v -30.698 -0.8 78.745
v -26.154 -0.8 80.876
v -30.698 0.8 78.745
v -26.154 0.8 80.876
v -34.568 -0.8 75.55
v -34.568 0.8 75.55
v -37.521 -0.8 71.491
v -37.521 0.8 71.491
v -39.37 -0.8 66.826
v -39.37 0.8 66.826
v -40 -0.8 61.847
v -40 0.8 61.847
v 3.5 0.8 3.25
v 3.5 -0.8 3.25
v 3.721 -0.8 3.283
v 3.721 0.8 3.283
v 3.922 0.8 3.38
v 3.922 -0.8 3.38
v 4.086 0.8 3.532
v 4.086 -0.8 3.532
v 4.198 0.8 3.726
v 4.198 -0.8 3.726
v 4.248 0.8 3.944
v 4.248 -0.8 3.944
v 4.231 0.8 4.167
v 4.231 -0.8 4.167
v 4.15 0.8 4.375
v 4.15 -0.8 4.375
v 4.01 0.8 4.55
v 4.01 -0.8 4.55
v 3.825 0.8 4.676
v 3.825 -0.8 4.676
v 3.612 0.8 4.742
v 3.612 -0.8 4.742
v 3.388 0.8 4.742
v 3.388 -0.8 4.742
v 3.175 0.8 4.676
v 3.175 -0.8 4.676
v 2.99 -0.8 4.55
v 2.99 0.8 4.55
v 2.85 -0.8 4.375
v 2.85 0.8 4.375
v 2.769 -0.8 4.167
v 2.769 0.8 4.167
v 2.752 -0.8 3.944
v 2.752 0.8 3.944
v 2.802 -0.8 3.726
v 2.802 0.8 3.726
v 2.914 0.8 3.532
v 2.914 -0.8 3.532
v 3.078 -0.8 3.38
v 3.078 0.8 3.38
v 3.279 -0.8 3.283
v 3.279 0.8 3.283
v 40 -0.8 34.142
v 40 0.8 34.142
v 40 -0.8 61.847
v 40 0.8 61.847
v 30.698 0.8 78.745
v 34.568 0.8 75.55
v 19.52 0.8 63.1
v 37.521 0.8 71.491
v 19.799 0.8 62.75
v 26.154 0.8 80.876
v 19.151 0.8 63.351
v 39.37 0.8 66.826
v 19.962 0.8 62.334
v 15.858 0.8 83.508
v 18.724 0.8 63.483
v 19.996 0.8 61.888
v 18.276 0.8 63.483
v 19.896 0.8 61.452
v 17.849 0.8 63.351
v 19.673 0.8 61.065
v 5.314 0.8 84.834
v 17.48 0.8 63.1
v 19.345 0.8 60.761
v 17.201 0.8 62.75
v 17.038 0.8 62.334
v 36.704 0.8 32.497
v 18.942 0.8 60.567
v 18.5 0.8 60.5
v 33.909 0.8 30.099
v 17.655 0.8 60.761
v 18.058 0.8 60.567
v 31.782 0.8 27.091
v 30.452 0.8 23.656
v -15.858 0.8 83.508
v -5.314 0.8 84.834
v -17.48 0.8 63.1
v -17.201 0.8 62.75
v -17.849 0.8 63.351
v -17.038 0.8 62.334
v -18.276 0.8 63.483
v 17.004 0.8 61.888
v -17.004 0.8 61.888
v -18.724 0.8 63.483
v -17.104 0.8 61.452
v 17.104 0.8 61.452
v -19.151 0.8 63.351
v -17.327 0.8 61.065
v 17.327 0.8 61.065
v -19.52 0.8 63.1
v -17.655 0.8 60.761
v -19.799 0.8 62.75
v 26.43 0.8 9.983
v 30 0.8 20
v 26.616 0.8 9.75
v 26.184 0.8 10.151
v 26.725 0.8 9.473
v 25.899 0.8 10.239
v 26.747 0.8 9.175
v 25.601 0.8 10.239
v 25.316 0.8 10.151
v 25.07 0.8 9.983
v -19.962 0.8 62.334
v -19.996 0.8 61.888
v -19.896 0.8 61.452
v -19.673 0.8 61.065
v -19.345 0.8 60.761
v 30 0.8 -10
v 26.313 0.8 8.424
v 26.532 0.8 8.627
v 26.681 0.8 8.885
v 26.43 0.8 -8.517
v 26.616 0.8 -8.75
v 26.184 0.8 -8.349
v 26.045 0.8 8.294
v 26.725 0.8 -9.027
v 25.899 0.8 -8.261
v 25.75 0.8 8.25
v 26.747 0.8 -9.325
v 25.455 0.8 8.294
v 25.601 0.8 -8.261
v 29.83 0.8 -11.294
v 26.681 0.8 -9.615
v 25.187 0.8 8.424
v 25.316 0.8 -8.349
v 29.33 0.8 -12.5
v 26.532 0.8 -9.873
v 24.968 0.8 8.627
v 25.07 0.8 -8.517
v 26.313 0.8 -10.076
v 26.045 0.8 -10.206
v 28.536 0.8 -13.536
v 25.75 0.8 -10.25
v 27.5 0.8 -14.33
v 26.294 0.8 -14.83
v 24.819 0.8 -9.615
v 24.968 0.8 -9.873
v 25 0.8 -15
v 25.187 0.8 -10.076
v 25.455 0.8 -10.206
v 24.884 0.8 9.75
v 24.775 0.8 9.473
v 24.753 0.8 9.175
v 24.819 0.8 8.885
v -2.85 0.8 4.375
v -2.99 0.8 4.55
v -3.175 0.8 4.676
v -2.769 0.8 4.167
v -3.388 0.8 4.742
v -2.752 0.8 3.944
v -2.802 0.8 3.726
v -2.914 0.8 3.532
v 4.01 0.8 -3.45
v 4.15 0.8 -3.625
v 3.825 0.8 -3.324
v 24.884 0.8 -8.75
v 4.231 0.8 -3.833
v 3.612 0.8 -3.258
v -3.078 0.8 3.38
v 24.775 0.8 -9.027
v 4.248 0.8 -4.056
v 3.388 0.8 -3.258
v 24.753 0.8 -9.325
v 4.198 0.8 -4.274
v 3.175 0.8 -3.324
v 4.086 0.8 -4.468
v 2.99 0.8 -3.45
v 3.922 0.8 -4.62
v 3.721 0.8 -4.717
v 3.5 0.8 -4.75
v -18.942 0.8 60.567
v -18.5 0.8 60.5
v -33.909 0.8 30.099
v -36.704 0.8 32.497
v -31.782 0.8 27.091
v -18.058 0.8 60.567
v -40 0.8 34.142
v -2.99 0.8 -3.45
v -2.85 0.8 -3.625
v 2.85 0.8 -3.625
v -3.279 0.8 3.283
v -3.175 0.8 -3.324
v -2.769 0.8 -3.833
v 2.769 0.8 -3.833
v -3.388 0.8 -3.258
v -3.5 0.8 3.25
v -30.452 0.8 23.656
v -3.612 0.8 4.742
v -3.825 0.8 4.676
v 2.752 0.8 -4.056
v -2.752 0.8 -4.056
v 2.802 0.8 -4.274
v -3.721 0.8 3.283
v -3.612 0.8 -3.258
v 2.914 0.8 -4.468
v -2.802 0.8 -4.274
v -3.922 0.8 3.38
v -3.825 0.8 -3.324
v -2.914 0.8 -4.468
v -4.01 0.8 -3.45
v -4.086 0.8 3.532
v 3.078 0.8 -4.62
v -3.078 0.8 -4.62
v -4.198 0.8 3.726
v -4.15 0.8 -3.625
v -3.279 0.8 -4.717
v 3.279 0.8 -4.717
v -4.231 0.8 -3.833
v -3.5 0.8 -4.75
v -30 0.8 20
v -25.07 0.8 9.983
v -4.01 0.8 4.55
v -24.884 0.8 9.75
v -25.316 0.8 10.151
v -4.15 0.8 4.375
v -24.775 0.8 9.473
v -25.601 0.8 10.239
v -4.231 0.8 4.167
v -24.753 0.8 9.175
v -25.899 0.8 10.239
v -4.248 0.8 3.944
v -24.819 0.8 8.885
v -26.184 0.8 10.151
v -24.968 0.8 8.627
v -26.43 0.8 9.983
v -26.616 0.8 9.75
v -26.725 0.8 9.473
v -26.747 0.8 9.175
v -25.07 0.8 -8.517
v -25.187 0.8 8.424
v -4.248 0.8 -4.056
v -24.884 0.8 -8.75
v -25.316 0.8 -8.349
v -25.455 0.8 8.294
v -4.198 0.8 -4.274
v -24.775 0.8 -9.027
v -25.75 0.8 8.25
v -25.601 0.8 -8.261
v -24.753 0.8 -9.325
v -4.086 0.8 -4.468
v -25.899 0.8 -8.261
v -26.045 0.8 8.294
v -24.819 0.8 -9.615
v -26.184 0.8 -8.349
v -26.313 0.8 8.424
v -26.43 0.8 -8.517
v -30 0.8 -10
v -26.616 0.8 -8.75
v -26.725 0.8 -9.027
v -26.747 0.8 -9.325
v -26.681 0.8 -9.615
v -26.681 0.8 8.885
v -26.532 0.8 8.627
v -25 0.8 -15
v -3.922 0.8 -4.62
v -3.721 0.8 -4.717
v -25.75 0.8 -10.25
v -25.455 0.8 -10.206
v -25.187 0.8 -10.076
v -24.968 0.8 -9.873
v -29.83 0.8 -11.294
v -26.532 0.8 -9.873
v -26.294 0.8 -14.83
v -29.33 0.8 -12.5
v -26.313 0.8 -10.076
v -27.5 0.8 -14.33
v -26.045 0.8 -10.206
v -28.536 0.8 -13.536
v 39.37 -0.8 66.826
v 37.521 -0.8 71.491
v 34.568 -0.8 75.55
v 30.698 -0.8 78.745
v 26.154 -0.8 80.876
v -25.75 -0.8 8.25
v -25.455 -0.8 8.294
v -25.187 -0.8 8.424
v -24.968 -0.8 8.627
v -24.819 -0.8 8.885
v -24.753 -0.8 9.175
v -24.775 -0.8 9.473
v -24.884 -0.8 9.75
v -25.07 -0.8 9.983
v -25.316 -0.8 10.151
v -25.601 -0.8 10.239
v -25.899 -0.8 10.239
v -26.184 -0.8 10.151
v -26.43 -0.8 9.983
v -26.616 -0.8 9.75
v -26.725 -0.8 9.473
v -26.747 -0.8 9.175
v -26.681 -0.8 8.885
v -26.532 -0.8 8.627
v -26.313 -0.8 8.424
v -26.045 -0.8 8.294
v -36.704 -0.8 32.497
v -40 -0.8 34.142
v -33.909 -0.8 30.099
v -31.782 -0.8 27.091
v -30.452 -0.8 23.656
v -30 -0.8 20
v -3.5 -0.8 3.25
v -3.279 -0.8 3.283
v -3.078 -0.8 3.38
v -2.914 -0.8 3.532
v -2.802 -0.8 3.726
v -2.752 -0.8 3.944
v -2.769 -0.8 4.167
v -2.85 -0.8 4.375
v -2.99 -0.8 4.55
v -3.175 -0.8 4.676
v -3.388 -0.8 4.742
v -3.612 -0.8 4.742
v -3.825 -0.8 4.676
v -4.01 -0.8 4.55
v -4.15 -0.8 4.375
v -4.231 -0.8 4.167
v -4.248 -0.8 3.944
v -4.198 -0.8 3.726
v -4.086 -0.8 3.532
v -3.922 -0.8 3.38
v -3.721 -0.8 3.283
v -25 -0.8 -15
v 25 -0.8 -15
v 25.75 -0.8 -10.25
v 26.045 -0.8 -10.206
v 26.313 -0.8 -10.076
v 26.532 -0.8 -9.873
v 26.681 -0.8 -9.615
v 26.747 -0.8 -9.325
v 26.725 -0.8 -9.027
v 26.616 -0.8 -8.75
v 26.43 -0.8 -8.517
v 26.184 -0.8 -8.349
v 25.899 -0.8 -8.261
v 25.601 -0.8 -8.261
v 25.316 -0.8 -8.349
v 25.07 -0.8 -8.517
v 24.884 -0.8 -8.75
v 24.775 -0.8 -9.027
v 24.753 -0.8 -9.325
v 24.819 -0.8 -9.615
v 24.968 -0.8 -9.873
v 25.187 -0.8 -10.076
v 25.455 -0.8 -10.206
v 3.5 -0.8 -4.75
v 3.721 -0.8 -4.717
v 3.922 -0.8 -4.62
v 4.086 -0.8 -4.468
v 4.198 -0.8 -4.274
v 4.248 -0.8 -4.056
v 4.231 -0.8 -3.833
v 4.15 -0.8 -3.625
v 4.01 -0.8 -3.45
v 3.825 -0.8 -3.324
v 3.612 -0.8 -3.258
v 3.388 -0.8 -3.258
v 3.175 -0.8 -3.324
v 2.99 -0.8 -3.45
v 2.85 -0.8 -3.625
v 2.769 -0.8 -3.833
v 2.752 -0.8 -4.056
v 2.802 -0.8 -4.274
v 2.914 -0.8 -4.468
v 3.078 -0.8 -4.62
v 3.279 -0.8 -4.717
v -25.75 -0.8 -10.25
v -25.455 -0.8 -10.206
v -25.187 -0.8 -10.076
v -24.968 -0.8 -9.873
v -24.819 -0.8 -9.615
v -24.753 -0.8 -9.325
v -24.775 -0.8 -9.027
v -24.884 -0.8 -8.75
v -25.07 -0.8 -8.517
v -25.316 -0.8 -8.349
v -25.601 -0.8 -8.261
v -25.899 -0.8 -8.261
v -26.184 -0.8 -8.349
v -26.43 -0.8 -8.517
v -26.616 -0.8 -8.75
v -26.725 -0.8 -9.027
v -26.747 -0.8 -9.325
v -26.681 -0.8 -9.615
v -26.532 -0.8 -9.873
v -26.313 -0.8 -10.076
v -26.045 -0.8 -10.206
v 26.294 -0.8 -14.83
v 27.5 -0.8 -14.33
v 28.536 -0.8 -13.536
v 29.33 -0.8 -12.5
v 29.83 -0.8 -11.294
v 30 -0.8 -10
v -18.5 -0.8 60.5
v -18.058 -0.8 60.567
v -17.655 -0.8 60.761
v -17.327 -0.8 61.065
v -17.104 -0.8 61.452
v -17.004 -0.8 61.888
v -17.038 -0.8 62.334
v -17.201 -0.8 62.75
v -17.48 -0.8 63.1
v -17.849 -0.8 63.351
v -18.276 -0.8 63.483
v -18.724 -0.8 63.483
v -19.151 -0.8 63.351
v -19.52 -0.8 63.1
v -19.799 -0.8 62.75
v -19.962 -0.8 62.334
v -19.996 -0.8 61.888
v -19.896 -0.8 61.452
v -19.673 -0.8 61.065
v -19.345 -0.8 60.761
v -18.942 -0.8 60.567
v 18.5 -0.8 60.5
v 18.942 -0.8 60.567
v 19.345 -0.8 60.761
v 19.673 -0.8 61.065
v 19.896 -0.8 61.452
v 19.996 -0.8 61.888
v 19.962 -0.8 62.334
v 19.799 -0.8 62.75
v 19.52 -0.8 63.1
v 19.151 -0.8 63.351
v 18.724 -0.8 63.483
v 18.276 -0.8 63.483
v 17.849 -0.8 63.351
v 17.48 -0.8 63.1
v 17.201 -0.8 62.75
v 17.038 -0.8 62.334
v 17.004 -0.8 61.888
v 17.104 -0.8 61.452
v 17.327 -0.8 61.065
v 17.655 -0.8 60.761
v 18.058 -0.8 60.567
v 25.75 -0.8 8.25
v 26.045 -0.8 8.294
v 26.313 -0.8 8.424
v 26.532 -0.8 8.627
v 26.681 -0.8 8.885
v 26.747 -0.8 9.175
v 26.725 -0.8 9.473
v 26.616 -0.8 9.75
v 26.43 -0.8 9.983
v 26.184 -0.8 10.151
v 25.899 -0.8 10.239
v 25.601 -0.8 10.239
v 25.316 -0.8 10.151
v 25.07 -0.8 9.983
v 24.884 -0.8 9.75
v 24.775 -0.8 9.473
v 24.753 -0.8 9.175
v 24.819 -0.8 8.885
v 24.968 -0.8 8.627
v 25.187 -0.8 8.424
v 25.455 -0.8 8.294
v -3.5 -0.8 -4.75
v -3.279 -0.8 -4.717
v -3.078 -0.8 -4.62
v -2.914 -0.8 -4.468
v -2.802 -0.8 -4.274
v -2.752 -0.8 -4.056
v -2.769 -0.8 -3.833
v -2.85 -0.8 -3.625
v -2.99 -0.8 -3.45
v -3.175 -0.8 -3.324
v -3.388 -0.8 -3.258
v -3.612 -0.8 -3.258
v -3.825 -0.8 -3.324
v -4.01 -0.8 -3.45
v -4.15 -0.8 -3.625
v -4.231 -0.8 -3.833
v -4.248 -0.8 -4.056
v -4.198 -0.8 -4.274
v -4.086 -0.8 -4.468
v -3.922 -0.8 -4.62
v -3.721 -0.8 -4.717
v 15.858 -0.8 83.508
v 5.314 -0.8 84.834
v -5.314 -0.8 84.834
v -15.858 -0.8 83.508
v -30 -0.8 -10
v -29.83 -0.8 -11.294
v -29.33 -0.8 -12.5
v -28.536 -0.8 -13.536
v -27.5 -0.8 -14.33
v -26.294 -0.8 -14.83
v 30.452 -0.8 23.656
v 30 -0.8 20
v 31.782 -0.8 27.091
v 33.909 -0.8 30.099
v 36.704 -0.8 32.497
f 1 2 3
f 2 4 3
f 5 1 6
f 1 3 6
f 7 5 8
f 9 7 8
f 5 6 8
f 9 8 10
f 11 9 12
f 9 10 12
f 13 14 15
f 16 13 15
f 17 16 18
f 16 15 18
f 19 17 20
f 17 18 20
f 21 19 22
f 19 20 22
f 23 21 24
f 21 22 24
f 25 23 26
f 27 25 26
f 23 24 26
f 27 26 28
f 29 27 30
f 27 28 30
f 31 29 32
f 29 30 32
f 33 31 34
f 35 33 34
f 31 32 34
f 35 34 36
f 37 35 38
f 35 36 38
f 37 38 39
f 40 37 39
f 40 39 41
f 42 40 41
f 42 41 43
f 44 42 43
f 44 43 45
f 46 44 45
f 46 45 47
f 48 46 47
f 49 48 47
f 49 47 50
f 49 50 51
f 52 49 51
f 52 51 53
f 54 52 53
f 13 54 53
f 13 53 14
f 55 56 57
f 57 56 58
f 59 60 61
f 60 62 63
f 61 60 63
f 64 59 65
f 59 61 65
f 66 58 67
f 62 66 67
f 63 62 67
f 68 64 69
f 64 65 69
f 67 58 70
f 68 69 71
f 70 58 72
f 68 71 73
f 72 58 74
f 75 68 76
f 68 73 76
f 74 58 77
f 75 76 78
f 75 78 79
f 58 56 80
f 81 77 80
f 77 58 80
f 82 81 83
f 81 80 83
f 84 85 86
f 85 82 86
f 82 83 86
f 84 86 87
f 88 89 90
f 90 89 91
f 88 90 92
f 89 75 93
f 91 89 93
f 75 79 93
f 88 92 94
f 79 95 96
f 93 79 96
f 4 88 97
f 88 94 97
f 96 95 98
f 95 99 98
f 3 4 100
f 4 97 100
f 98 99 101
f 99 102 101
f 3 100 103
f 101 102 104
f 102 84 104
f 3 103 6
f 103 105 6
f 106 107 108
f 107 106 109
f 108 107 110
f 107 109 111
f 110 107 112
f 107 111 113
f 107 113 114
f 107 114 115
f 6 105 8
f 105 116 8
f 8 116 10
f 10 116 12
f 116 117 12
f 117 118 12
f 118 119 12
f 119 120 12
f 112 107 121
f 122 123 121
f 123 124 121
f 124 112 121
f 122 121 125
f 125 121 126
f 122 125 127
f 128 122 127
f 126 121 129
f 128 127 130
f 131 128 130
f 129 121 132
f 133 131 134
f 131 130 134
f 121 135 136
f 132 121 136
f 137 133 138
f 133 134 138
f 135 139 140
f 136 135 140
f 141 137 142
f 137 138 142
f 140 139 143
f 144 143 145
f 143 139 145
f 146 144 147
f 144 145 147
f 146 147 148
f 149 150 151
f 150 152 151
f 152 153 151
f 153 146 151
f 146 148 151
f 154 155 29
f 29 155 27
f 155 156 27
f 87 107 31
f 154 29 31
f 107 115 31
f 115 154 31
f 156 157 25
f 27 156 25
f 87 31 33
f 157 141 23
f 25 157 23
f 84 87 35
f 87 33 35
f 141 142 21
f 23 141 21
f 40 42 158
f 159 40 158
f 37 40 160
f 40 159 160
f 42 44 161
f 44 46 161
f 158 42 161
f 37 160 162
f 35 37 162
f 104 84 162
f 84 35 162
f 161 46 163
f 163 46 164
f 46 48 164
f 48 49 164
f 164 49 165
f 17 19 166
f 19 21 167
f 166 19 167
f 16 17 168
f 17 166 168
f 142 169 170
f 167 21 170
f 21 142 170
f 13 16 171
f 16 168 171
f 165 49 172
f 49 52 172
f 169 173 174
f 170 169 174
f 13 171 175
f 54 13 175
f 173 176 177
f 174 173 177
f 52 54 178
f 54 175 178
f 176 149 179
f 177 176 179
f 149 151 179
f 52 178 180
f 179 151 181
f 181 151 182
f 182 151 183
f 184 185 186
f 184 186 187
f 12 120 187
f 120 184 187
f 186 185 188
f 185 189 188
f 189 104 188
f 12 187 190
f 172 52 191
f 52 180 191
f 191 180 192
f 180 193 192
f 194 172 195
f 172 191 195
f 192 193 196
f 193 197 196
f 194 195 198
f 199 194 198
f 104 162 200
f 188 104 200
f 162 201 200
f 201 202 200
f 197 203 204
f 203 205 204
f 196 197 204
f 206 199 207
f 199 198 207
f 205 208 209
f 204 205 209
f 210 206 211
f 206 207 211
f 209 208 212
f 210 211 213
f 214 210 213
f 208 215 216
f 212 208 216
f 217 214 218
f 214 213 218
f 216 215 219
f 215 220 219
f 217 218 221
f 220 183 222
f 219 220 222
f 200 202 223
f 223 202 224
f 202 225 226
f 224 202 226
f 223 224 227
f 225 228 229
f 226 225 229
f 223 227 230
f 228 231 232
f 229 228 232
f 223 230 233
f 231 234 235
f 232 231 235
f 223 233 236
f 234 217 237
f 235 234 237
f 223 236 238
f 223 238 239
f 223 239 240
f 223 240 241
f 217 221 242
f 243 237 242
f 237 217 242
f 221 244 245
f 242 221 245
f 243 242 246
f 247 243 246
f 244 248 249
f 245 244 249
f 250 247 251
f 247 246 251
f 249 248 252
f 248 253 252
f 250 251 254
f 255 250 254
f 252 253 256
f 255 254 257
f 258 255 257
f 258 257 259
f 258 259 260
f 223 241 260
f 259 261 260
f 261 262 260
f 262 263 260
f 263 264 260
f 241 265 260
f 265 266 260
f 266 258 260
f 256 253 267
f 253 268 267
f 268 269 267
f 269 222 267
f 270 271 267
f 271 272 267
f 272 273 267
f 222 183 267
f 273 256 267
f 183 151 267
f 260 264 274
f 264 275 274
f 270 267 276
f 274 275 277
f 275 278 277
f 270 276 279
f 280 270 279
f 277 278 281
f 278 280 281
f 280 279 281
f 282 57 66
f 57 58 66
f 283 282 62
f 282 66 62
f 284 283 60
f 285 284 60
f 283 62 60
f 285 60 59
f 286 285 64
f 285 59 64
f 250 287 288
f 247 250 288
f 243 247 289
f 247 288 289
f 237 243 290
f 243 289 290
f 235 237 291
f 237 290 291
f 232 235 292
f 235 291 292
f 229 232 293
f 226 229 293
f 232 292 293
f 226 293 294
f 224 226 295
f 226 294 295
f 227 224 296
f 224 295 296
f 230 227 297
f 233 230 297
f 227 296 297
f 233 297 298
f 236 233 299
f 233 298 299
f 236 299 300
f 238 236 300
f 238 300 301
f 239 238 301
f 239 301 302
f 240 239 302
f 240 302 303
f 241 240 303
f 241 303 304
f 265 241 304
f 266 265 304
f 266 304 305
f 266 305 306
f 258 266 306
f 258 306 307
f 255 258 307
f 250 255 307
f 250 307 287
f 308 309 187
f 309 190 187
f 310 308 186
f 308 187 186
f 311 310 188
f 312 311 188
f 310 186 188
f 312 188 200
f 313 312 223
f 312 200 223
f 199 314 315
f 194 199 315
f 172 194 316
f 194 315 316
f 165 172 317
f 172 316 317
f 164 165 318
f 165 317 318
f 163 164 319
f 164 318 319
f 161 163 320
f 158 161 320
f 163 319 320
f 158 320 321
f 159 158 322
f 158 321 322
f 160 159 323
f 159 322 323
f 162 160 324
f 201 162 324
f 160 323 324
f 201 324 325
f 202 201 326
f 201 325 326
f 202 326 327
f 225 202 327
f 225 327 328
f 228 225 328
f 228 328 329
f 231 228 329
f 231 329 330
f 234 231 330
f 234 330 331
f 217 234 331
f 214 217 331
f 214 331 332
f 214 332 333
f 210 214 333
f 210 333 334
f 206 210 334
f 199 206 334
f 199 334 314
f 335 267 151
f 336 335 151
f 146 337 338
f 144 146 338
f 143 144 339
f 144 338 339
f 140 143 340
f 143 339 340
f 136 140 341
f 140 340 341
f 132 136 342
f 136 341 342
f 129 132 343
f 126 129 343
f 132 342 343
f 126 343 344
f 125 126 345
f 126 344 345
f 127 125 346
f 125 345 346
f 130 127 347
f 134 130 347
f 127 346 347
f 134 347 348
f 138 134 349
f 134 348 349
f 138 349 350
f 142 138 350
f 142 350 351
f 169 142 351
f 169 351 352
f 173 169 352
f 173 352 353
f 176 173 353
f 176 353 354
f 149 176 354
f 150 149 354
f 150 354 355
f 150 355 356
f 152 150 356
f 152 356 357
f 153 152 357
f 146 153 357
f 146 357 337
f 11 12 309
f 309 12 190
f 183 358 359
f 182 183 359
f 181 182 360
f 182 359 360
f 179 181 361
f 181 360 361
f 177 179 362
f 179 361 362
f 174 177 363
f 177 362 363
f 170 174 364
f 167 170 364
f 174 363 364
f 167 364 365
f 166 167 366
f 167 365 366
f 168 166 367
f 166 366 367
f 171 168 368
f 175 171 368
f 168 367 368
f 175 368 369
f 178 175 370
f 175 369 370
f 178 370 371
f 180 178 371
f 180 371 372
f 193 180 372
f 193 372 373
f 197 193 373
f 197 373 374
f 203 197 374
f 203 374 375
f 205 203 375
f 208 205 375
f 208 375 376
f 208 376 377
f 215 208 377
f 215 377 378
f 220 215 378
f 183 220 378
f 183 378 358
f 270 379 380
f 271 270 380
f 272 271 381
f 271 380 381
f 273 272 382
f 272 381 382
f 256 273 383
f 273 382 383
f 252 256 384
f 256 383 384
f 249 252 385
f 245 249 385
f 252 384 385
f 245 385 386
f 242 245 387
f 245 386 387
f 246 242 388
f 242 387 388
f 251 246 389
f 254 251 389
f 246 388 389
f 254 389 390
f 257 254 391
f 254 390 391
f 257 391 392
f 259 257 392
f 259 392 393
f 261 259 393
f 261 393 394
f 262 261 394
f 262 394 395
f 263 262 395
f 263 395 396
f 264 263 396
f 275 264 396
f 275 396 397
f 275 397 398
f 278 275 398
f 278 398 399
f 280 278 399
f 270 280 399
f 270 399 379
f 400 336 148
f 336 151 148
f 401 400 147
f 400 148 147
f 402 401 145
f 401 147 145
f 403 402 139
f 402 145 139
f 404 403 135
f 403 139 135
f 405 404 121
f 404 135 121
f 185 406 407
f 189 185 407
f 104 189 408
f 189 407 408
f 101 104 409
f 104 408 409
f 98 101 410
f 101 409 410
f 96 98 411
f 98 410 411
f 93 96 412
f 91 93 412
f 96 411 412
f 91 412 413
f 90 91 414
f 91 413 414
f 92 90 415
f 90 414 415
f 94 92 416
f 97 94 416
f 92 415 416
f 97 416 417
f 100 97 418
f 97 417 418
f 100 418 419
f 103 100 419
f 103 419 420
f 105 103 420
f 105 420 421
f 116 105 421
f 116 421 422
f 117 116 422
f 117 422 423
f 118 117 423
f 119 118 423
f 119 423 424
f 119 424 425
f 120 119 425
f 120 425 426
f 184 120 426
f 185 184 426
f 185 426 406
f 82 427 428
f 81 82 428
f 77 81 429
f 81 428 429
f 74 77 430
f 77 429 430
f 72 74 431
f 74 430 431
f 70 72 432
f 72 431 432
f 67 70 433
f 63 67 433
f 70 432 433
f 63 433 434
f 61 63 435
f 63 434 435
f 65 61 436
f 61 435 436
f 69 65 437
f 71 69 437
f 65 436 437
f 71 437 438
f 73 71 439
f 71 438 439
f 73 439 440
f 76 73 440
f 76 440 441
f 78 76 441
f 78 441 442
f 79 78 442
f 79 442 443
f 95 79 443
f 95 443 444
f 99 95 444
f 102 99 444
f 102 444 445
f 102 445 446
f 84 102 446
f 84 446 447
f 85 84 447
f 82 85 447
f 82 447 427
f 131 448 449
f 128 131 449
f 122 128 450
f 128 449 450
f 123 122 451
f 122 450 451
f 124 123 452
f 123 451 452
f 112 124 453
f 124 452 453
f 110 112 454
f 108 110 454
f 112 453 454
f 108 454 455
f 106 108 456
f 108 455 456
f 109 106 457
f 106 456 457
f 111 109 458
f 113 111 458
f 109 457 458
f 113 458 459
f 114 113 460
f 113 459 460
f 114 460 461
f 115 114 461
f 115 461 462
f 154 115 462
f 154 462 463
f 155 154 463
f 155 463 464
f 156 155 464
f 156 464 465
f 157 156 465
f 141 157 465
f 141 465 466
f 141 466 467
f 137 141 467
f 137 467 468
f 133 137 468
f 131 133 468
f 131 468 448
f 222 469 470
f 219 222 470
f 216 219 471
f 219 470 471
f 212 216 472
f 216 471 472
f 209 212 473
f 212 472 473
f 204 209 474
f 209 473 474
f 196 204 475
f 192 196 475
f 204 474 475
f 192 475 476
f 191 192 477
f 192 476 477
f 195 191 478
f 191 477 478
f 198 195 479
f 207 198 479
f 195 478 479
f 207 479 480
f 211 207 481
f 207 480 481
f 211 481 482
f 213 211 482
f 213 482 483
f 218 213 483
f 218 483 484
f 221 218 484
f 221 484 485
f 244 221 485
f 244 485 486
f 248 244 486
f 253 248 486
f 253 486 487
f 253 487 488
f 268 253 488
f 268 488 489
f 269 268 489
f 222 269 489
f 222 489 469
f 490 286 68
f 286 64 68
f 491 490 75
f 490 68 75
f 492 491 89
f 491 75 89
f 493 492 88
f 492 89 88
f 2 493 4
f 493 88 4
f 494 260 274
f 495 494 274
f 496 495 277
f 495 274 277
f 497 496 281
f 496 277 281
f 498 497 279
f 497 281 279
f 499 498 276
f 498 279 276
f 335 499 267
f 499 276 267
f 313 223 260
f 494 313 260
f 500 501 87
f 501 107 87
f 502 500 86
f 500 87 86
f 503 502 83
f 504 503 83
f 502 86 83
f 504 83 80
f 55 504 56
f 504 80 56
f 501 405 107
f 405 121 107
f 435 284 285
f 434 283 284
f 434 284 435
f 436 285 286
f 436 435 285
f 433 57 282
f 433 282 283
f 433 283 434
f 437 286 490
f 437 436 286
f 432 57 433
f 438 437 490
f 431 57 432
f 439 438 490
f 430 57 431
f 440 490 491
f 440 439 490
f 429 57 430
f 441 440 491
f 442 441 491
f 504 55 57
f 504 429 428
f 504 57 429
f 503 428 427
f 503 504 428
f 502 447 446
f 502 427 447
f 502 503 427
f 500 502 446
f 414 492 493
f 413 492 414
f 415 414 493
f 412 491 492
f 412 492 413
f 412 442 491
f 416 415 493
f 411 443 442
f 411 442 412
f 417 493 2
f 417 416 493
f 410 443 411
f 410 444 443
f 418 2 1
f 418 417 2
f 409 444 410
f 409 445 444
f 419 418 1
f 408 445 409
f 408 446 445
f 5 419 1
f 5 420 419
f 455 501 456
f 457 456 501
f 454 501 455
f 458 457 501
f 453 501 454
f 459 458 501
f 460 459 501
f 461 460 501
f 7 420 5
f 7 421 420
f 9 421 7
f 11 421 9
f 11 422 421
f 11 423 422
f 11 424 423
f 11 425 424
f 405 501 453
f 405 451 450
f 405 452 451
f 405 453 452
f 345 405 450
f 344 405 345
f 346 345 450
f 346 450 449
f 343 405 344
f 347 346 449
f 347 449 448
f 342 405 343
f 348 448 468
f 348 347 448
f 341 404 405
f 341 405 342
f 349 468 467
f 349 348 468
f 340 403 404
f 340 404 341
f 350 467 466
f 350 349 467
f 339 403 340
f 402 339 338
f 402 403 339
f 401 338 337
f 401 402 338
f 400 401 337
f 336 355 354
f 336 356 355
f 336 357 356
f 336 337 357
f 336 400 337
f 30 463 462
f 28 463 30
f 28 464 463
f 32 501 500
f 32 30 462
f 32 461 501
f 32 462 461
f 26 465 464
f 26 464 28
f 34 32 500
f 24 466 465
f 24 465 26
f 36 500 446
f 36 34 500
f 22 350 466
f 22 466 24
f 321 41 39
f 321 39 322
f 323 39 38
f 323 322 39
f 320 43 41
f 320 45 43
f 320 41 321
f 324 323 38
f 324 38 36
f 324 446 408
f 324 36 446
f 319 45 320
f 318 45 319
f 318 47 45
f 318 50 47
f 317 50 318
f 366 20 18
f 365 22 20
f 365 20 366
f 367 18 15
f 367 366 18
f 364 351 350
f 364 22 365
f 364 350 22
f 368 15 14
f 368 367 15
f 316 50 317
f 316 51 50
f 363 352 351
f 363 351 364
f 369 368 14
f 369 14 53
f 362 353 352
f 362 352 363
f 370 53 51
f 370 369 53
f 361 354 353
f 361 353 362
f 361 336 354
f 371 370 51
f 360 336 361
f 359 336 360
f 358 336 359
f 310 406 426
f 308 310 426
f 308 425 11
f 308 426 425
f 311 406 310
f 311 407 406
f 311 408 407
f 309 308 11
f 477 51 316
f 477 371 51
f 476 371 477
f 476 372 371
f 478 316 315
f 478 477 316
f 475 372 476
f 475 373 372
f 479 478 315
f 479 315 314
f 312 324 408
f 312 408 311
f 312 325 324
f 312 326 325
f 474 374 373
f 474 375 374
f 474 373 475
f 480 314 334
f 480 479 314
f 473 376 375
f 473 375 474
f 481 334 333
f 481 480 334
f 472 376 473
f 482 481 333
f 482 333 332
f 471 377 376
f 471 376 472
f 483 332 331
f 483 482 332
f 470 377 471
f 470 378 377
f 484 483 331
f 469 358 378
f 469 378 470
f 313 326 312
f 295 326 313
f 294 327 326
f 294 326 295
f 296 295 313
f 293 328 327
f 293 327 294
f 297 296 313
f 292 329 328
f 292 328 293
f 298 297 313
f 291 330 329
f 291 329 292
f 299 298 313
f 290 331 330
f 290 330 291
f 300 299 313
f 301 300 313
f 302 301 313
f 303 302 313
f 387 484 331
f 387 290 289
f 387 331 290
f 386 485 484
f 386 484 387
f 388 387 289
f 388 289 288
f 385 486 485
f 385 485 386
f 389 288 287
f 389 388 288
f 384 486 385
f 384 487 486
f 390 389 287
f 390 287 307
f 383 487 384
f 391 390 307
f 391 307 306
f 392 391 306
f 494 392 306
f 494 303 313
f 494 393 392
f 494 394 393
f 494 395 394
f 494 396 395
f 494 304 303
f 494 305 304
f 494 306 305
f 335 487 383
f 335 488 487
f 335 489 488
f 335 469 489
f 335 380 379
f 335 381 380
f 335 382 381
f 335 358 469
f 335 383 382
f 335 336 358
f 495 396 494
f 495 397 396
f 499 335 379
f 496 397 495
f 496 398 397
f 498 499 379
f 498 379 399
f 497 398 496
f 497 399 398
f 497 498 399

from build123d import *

# Parameters (mm, degrees)
P_IDAT_VYSUNUT_M1_DEPTH  = 0.8
SKICA2_R                 = 1
ODEBRAT_VYSUNUT_M1_DEPTH = 94.955095657
SKICA3_R                 = 0.75
ODEBRAT_VYSUNUT_M2_DEPTH = 94.955095657
SKICA8_R                 = 1.5
ODEBRAT_VYSUNUT_M4_DEPTH = 94.955095657


with BuildPart() as part:
    # Skica1 → Přidat vysunutím1 (new, symmetric)
    with BuildSketch(Plane(origin=(0, 0, 0), x_dir=(1, 0, 0), z_dir=(0, 1, 0))):
        with BuildLine():
            Line((-25, 15), (25, 15))
            ThreePointArc((25, 15), (28.535533906, 13.535533906), (30, 10))
            Line((30, 10), (30, -20))
            ThreePointArc((30, -20), (32.752551286, -28.660254038), (40, -34.142135624))
            Line((40, -34.142135624), (40, -61.846584384))
            ThreePointArc((40, -61.846584384), (36.172150801, -73.613552493), (26.153846154, -80.876302656))
            ThreePointArc((26.153846154, -80.876302656), (0, -85), (-26.153846154, -80.876302656))
            ThreePointArc((-26.153846154, -80.876302656), (-36.172150801, -73.613552493), (-40, -61.846584384))
            Line((-40, -61.846584384), (-40, -34.142135624))
            ThreePointArc((-40, -34.142135624), (-32.752551286, -28.660254038), (-30, -20))
            Line((-30, -20), (-30, 10))
            ThreePointArc((-30, 10), (-28.535533906, 13.535533906), (-25, 15))
        make_face()
    extrude(amount=P_IDAT_VYSUNUT_M1_DEPTH, both=True)

    # Skica2 → Odebrat vysunutím1 (cut, through all)
    with BuildSketch(Plane.XZ.offset(0.8)):
        with Locations(Location((-25.75, -9.25, 0), (0, 0, 270))):
            Circle(SKICA2_R)
        with Locations(Location((-25.75, 9.25, 0), (0, 0, 270))):
            Circle(SKICA2_R)
        with Locations(Location((25.75, 9.25, 0), (0, 0, 270))):
            Circle(SKICA2_R)
        with Locations(Location((25.75, -9.25, 0), (0, 0, 270))):
            Circle(SKICA2_R)
    extrude(amount=-ODEBRAT_VYSUNUT_M1_DEPTH, mode=Mode.SUBTRACT)

    # Skica3 → Odebrat vysunutím2 (cut, through all)
    with BuildSketch(Plane.XZ.offset(0.8)):
        with Locations(Location((-3.5, 4, 0), (0, 0, 270))):
            Circle(SKICA3_R)
        with Locations(Location((3.5, 4, 0), (0, 0, 270))):
            Circle(SKICA3_R)
        with Locations(Location((-3.5, -4, 0), (0, 0, 270))):
            Circle(SKICA3_R)
        with Locations(Location((3.5, -4, 0), (0, 0, 270))):
            Circle(SKICA3_R)
    extrude(amount=-ODEBRAT_VYSUNUT_M2_DEPTH, mode=Mode.SUBTRACT)

    # Skica8 → Odebrat vysunutím4 (cut, through all)
    with BuildSketch(Plane.XZ.offset(0.8)):
        with Locations(Location((18.5, 62, 0), (0, 0, 270))):
            Circle(SKICA8_R)
        with Locations(Location((-18.5, 62, 0), (0, 0, 270))):
            Circle(SKICA8_R)
    extrude(amount=-ODEBRAT_VYSUNUT_M4_DEPTH, mode=Mode.SUBTRACT)


solid = part.part
